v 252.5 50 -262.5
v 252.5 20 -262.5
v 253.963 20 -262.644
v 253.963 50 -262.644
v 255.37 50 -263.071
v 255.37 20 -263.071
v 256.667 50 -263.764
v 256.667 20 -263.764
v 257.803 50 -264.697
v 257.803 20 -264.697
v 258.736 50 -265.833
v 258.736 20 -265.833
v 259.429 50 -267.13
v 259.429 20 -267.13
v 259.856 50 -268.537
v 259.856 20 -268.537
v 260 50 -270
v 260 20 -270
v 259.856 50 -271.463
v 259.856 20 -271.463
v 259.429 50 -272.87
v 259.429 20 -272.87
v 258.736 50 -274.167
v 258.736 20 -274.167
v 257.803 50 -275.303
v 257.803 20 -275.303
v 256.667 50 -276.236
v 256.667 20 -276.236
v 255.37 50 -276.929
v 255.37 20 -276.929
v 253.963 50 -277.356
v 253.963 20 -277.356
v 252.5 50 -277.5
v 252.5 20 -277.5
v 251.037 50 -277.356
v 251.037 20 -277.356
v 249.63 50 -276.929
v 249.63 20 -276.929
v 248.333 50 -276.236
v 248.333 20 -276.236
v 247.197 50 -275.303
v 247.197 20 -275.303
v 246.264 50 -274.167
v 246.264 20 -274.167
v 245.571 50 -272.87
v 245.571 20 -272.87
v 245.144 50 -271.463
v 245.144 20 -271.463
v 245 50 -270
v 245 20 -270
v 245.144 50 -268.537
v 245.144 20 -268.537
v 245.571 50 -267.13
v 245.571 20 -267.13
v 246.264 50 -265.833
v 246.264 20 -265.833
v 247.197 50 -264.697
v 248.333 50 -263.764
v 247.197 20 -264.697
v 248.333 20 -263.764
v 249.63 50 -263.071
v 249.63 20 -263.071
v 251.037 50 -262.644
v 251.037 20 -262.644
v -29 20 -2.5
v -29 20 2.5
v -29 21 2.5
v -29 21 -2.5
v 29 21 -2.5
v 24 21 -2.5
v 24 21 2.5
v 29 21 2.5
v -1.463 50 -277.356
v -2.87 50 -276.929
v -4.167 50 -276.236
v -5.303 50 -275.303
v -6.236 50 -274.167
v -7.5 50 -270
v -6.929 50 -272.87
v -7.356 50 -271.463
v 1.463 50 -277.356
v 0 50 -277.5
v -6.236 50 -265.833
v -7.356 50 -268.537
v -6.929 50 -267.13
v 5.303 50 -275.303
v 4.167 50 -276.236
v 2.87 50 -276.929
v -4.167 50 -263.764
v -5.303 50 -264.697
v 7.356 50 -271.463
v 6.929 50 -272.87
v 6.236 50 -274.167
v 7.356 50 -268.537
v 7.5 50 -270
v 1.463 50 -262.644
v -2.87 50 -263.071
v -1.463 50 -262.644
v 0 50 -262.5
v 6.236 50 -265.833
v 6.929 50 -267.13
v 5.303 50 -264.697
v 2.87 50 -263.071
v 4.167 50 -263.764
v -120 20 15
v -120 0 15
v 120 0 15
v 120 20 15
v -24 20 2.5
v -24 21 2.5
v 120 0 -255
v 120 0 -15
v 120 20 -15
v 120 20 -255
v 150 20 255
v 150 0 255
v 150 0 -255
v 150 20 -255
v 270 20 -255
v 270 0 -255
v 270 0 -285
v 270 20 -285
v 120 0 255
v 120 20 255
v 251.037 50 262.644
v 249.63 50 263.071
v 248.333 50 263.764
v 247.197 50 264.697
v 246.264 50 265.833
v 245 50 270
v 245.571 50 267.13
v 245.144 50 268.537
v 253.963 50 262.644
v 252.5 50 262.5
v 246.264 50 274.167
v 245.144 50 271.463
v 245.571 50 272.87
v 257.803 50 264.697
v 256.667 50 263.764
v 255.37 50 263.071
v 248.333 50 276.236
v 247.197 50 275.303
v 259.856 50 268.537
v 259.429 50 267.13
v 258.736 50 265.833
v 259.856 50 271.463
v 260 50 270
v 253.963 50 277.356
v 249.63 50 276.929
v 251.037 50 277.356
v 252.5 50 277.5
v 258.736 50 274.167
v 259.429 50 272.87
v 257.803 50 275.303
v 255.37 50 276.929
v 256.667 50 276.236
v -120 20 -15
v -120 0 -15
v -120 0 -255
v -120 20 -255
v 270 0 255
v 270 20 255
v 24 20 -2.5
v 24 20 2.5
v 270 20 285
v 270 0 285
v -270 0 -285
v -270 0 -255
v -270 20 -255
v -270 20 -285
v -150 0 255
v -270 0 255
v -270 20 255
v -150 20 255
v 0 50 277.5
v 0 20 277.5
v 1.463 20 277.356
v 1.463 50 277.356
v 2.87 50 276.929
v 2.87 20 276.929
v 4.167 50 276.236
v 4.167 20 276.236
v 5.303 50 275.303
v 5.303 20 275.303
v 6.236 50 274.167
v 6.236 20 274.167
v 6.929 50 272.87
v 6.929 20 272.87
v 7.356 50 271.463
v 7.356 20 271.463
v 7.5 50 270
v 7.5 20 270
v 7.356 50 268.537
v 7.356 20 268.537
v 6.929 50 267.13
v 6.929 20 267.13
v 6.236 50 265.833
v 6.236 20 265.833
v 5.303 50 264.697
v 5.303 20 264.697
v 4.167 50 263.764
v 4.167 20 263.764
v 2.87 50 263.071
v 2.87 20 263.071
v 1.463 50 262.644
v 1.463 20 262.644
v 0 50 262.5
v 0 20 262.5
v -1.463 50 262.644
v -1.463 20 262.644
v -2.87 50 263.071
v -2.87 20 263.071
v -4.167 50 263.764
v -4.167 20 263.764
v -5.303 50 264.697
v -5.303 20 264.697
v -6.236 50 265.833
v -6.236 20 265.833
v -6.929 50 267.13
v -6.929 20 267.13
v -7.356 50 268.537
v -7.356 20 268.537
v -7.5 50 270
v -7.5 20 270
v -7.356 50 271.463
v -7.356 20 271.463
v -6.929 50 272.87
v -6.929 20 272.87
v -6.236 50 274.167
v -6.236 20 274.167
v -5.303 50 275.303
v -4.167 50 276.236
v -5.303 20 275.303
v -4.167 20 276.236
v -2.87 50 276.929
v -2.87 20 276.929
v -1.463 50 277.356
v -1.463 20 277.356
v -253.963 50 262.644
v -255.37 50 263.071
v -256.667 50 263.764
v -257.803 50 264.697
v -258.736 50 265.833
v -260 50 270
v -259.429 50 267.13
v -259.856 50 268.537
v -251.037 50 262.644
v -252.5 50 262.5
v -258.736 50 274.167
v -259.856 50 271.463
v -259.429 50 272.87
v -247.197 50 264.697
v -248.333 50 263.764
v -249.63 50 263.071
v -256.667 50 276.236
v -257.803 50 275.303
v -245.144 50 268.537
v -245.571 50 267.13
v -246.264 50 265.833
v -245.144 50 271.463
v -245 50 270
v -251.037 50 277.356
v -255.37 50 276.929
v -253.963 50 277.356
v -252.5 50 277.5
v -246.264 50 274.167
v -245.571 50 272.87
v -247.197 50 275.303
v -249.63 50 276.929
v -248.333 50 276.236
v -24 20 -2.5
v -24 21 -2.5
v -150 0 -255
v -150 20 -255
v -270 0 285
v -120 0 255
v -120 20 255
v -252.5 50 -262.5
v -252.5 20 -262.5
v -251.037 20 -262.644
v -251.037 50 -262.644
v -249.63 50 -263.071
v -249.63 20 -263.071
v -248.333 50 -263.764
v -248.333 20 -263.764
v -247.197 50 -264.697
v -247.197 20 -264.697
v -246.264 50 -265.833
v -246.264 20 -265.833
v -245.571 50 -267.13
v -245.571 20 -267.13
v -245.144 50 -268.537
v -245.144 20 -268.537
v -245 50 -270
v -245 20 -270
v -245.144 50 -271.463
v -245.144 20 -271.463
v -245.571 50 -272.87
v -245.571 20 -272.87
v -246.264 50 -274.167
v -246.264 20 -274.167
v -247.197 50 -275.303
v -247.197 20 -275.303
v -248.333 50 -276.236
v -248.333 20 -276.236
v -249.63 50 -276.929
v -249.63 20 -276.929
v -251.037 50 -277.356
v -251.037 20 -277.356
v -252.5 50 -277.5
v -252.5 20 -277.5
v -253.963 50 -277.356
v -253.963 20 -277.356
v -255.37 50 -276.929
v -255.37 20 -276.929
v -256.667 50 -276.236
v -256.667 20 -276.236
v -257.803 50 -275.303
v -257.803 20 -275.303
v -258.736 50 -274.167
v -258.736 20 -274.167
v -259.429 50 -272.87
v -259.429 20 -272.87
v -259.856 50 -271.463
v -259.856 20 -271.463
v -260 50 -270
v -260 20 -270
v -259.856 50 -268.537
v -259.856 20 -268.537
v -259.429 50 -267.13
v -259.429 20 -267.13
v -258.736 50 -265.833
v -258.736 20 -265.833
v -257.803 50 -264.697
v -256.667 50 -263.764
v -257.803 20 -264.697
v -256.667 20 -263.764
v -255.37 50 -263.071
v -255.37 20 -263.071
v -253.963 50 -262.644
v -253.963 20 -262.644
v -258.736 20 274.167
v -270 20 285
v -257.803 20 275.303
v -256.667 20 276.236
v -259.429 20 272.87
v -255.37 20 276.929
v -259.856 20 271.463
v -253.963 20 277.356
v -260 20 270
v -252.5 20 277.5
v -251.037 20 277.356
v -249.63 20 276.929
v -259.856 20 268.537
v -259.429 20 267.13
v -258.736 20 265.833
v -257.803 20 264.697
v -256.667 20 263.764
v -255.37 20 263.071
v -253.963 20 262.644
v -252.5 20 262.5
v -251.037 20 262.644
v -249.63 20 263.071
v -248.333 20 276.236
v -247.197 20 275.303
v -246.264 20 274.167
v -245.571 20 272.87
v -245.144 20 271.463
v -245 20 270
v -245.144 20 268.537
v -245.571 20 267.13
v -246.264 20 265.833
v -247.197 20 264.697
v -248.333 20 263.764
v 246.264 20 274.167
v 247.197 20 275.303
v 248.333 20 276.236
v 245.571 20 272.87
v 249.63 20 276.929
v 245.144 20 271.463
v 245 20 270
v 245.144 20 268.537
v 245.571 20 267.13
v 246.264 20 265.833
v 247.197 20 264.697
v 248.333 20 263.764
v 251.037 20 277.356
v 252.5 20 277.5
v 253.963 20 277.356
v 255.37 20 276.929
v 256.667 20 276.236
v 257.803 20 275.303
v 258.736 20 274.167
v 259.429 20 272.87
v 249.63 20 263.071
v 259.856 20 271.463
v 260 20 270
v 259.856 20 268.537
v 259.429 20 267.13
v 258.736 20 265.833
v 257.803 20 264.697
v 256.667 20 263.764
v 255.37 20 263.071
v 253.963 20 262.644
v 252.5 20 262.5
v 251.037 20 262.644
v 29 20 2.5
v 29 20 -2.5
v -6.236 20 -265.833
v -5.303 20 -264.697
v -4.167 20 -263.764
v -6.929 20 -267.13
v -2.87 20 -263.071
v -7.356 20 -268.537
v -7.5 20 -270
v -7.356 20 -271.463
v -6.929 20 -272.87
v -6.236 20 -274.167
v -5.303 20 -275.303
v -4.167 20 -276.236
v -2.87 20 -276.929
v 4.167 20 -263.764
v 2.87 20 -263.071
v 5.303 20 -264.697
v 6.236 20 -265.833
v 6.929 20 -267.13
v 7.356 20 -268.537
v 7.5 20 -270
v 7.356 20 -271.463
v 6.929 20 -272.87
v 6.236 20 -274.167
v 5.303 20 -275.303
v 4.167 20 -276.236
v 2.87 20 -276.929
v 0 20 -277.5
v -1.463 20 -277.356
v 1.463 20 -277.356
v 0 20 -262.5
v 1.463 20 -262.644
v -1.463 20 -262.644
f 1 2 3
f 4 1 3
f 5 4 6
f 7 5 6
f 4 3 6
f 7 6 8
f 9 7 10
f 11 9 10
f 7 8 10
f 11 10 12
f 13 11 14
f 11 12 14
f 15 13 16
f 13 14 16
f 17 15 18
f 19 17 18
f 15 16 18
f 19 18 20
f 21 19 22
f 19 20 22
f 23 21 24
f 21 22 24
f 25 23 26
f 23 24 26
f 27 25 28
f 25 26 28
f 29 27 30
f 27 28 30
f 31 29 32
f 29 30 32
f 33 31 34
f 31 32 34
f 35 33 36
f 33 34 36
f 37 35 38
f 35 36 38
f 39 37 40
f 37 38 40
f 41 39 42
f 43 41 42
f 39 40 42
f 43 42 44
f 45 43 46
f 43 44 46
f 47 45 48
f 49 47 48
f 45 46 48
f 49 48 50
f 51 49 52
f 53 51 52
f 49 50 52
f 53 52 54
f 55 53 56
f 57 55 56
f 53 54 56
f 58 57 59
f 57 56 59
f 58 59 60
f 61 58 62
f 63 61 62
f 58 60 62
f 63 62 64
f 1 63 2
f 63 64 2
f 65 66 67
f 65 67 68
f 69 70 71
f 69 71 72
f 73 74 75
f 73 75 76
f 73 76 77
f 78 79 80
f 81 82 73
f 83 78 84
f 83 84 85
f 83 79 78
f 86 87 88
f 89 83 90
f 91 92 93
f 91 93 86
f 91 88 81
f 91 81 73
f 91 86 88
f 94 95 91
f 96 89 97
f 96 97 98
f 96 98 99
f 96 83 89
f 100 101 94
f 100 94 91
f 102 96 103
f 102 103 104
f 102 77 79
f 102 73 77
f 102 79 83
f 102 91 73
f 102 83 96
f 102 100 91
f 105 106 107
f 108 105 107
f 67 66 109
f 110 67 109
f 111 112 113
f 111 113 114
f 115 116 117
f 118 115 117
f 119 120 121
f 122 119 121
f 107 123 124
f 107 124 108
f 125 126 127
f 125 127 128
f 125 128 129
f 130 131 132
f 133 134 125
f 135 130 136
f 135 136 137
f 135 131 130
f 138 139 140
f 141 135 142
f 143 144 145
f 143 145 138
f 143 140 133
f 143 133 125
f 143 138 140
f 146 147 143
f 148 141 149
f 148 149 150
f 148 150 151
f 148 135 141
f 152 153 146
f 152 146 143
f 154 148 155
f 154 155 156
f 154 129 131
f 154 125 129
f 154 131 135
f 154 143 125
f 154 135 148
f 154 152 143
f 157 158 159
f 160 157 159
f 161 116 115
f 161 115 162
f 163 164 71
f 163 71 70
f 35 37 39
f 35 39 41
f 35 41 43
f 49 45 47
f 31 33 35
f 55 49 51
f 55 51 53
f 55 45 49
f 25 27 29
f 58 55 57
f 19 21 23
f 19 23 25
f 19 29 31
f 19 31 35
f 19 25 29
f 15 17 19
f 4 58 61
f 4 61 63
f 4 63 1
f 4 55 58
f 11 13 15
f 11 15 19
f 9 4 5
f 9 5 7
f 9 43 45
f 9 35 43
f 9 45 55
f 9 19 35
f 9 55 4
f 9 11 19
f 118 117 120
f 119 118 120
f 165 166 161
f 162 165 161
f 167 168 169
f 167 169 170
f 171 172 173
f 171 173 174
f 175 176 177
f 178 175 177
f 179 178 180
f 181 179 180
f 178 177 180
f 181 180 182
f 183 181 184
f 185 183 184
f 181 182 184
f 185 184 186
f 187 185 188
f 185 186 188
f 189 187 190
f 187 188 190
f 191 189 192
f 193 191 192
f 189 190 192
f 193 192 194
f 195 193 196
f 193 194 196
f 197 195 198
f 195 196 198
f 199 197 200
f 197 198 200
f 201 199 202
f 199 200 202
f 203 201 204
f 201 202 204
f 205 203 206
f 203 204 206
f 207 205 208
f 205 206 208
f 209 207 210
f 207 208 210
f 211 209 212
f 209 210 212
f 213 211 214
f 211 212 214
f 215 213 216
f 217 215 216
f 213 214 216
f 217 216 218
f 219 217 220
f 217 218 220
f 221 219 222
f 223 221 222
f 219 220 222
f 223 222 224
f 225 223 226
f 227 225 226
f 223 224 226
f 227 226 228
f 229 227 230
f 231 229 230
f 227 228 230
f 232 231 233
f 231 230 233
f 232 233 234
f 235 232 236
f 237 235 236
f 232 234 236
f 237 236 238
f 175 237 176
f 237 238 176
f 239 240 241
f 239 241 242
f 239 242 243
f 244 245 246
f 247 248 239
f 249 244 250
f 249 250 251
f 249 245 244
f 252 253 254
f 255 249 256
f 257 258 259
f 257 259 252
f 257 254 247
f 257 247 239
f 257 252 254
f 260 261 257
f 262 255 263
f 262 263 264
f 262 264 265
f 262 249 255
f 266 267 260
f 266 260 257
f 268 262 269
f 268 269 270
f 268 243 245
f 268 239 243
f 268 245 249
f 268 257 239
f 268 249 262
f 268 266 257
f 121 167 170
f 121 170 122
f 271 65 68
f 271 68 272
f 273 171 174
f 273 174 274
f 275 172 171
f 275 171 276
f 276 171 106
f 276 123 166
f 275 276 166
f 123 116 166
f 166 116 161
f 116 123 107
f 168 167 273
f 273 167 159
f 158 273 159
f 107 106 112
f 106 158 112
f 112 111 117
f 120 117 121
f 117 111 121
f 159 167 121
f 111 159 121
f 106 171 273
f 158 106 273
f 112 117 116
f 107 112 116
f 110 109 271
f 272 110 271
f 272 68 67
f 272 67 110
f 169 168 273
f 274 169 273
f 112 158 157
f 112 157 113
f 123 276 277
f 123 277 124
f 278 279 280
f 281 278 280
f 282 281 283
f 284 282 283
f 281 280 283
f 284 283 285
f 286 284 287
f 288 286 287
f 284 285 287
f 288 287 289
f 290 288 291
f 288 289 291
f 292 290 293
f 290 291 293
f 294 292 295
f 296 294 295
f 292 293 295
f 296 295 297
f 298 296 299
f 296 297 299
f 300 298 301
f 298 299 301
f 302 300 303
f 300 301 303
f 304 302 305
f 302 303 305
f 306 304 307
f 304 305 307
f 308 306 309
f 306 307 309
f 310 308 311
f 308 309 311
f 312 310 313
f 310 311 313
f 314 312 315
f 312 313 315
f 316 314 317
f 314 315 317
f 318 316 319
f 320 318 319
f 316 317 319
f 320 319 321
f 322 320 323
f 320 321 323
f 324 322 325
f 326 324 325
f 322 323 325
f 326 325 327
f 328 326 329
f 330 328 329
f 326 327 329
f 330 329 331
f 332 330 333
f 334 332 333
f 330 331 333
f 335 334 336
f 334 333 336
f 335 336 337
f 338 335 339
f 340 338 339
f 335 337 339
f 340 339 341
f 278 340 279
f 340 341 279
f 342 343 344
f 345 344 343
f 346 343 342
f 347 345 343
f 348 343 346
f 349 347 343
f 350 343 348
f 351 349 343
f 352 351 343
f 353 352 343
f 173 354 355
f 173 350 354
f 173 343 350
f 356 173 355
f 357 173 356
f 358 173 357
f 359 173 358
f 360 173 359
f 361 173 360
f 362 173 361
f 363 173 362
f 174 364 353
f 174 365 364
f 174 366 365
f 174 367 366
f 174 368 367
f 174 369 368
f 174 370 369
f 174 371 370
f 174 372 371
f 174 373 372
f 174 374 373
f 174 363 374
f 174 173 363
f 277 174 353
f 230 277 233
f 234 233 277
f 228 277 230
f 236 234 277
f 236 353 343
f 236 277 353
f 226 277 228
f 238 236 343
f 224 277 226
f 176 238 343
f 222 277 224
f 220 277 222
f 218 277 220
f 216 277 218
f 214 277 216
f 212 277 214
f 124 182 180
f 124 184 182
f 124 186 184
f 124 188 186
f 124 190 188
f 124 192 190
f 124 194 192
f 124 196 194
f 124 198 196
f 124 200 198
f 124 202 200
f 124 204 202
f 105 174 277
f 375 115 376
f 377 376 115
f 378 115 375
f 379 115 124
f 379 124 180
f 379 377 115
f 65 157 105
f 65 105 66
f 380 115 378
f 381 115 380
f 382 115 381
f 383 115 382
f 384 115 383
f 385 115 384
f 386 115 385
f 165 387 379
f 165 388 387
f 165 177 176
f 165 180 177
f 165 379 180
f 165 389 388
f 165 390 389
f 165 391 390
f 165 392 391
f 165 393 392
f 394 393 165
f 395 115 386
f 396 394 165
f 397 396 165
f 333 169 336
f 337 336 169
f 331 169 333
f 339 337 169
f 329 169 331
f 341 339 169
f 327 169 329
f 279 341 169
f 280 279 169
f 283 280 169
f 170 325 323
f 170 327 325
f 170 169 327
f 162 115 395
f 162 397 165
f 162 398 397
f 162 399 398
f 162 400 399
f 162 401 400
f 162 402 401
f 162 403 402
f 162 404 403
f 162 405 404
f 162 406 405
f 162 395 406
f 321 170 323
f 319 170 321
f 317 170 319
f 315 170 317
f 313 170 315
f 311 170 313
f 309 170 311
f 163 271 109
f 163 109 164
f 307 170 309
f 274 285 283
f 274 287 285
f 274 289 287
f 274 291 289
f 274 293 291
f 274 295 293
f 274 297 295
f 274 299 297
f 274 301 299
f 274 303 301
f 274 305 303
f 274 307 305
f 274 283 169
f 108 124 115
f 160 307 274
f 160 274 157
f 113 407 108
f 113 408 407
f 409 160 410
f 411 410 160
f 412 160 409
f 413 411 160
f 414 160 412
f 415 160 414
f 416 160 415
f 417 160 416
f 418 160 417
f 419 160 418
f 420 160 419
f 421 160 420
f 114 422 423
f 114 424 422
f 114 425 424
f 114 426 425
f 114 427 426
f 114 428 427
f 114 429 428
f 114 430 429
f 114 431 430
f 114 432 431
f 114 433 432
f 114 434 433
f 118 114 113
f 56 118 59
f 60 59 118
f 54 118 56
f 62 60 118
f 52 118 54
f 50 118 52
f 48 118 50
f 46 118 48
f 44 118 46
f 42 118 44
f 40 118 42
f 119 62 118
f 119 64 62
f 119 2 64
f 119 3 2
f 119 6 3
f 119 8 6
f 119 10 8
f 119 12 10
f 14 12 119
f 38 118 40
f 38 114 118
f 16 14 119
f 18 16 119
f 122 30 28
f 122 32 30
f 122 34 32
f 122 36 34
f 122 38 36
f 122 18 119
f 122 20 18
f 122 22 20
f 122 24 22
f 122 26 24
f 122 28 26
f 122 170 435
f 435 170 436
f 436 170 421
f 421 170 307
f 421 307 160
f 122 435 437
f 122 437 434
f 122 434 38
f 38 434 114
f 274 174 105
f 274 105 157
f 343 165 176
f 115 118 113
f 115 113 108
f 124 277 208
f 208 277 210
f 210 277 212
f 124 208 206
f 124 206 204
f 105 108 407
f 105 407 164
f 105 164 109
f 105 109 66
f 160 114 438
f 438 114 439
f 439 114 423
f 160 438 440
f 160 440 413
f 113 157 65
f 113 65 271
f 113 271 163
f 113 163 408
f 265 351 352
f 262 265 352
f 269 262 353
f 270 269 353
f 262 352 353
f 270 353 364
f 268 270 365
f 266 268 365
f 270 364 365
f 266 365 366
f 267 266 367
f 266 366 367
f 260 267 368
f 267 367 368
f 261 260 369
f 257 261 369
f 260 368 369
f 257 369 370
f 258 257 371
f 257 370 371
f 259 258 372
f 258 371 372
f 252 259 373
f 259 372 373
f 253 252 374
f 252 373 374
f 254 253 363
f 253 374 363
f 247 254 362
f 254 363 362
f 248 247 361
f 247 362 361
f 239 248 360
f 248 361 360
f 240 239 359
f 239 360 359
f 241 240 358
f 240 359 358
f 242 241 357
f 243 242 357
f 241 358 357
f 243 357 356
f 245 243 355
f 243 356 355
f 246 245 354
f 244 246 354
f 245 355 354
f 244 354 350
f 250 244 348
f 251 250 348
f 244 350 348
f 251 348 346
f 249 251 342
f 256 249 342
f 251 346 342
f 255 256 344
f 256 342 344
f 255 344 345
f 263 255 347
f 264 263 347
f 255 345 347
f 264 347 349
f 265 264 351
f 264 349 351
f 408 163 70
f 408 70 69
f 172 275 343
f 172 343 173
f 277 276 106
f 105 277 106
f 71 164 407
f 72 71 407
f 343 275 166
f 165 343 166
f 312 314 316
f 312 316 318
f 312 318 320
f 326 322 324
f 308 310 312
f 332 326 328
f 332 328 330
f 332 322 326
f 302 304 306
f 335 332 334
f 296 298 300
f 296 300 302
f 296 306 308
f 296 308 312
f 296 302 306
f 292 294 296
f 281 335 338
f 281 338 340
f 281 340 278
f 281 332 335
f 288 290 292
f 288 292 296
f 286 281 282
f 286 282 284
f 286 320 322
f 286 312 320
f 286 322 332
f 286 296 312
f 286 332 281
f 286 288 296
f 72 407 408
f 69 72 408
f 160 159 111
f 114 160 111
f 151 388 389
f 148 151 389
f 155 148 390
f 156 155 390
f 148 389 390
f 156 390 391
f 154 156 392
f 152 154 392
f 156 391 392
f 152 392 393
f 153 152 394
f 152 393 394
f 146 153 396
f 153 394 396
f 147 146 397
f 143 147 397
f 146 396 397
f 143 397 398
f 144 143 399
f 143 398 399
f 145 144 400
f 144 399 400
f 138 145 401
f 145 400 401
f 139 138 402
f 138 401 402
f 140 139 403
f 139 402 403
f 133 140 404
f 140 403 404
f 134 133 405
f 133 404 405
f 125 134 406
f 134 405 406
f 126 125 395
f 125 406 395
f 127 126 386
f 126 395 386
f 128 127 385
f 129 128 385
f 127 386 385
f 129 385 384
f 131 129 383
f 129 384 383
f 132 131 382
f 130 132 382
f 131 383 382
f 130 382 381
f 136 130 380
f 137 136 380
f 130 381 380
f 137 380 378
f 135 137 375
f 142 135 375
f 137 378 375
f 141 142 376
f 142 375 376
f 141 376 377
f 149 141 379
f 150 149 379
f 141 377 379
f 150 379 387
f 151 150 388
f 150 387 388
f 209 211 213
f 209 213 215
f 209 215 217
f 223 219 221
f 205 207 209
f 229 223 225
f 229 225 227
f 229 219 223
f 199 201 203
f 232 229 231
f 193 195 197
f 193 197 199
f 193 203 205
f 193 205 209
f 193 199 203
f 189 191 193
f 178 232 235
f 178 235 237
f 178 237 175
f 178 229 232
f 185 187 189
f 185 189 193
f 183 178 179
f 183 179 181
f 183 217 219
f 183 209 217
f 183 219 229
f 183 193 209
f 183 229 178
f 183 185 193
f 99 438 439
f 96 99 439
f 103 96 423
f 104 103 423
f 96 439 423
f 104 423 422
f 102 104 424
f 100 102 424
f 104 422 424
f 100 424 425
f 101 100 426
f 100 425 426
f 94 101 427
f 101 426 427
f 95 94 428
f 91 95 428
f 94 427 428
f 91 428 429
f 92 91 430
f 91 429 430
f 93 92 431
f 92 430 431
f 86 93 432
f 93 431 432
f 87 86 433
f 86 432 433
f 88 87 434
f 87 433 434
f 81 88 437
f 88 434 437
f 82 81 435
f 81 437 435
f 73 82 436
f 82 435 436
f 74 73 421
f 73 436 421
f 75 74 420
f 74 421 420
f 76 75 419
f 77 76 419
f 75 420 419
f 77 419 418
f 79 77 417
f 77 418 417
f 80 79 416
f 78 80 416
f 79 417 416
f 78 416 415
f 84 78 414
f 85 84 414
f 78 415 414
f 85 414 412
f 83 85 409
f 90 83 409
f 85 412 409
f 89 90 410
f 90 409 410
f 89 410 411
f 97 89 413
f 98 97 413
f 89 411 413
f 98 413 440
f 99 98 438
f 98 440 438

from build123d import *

# Parameters (mm, degrees)
SKETCH1_W           = 240
SKETCH1_H           = 240
BOSS_EXTRUDE1_DEPTH = 20
SKETCH1_3_W         = 120
SKETCH1_3_H         = 30
BOSS_EXTRUDE2_DEPTH = 20
SKETCH2_R           = 7.5
BOSS_EXTRUDE3_DEPTH = 30
SKETCH4_W           = 5
SKETCH4_H           = 5
BOSS_EXTRUDE4_DEPTH = 1


with BuildPart() as part:
    # Sketch1 → Boss-Extrude1 (new body)
    with BuildSketch(Plane(origin=(0, 0, 0), x_dir=(1, 0, 0), z_dir=(0, 1, 0))):
        Polygon((150, 285), (-150, 285), (-150, 255), (-150, -255), (-150, -285), (150, -285), (150, -255), (150, 255), align=None)
        with Locations((0, -135)):
            Rectangle(SKETCH1_W, SKETCH1_H, mode=Mode.SUBTRACT)
        with Locations((0, 135)):
            Rectangle(SKETCH1_W, SKETCH1_H, mode=Mode.SUBTRACT)
    extrude(amount=BOSS_EXTRUDE1_DEPTH)

    # Sketch1<3> → Boss-Extrude2 (add)
    with BuildSketch(Plane(origin=(0, 0, 0), x_dir=(1, 0, 0), z_dir=(0, 1, 0))):
        with Locations((-210, 270)):
            Rectangle(SKETCH1_3_W, SKETCH1_3_H)
        with Locations((210, 270)):
            Rectangle(SKETCH1_3_W, SKETCH1_3_H)
        with Locations((-210, -270)):
            Rectangle(SKETCH1_3_W, SKETCH1_3_H)
        with Locations((210, -270)):
            Rectangle(SKETCH1_3_W, SKETCH1_3_H)
    extrude(amount=BOSS_EXTRUDE2_DEPTH)

    # Sketch2 → Boss-Extrude3 (add)
    with BuildSketch(Plane(origin=(0, 20, 0), x_dir=(1, 0, 0), z_dir=(0, 1, 0))):
        with Locations((0, 270)):
            Circle(SKETCH2_R)
        with Locations((252.5, 270)):
            Circle(SKETCH2_R)
        with Locations((-252.5, 270)):
            Circle(SKETCH2_R)
        with Locations((-252.5, -270)):
            Circle(SKETCH2_R)
        with Locations((252.5, -270)):
            Circle(SKETCH2_R)
        with Locations((0, -270)):
            Circle(SKETCH2_R)
    extrude(amount=BOSS_EXTRUDE3_DEPTH)

    # Sketch4 → Boss-Extrude4 (add)
    with BuildSketch(Plane(origin=(0, 20, 0), x_dir=(1, 0, 0), z_dir=(0, 1, 0))):
        with Locations((-26.5, 0)):
            Rectangle(SKETCH4_W, SKETCH4_H)
        with Locations((26.5, 0)):
            Rectangle(SKETCH4_W, SKETCH4_H)
    extrude(amount=BOSS_EXTRUDE4_DEPTH)


solid = part.part
